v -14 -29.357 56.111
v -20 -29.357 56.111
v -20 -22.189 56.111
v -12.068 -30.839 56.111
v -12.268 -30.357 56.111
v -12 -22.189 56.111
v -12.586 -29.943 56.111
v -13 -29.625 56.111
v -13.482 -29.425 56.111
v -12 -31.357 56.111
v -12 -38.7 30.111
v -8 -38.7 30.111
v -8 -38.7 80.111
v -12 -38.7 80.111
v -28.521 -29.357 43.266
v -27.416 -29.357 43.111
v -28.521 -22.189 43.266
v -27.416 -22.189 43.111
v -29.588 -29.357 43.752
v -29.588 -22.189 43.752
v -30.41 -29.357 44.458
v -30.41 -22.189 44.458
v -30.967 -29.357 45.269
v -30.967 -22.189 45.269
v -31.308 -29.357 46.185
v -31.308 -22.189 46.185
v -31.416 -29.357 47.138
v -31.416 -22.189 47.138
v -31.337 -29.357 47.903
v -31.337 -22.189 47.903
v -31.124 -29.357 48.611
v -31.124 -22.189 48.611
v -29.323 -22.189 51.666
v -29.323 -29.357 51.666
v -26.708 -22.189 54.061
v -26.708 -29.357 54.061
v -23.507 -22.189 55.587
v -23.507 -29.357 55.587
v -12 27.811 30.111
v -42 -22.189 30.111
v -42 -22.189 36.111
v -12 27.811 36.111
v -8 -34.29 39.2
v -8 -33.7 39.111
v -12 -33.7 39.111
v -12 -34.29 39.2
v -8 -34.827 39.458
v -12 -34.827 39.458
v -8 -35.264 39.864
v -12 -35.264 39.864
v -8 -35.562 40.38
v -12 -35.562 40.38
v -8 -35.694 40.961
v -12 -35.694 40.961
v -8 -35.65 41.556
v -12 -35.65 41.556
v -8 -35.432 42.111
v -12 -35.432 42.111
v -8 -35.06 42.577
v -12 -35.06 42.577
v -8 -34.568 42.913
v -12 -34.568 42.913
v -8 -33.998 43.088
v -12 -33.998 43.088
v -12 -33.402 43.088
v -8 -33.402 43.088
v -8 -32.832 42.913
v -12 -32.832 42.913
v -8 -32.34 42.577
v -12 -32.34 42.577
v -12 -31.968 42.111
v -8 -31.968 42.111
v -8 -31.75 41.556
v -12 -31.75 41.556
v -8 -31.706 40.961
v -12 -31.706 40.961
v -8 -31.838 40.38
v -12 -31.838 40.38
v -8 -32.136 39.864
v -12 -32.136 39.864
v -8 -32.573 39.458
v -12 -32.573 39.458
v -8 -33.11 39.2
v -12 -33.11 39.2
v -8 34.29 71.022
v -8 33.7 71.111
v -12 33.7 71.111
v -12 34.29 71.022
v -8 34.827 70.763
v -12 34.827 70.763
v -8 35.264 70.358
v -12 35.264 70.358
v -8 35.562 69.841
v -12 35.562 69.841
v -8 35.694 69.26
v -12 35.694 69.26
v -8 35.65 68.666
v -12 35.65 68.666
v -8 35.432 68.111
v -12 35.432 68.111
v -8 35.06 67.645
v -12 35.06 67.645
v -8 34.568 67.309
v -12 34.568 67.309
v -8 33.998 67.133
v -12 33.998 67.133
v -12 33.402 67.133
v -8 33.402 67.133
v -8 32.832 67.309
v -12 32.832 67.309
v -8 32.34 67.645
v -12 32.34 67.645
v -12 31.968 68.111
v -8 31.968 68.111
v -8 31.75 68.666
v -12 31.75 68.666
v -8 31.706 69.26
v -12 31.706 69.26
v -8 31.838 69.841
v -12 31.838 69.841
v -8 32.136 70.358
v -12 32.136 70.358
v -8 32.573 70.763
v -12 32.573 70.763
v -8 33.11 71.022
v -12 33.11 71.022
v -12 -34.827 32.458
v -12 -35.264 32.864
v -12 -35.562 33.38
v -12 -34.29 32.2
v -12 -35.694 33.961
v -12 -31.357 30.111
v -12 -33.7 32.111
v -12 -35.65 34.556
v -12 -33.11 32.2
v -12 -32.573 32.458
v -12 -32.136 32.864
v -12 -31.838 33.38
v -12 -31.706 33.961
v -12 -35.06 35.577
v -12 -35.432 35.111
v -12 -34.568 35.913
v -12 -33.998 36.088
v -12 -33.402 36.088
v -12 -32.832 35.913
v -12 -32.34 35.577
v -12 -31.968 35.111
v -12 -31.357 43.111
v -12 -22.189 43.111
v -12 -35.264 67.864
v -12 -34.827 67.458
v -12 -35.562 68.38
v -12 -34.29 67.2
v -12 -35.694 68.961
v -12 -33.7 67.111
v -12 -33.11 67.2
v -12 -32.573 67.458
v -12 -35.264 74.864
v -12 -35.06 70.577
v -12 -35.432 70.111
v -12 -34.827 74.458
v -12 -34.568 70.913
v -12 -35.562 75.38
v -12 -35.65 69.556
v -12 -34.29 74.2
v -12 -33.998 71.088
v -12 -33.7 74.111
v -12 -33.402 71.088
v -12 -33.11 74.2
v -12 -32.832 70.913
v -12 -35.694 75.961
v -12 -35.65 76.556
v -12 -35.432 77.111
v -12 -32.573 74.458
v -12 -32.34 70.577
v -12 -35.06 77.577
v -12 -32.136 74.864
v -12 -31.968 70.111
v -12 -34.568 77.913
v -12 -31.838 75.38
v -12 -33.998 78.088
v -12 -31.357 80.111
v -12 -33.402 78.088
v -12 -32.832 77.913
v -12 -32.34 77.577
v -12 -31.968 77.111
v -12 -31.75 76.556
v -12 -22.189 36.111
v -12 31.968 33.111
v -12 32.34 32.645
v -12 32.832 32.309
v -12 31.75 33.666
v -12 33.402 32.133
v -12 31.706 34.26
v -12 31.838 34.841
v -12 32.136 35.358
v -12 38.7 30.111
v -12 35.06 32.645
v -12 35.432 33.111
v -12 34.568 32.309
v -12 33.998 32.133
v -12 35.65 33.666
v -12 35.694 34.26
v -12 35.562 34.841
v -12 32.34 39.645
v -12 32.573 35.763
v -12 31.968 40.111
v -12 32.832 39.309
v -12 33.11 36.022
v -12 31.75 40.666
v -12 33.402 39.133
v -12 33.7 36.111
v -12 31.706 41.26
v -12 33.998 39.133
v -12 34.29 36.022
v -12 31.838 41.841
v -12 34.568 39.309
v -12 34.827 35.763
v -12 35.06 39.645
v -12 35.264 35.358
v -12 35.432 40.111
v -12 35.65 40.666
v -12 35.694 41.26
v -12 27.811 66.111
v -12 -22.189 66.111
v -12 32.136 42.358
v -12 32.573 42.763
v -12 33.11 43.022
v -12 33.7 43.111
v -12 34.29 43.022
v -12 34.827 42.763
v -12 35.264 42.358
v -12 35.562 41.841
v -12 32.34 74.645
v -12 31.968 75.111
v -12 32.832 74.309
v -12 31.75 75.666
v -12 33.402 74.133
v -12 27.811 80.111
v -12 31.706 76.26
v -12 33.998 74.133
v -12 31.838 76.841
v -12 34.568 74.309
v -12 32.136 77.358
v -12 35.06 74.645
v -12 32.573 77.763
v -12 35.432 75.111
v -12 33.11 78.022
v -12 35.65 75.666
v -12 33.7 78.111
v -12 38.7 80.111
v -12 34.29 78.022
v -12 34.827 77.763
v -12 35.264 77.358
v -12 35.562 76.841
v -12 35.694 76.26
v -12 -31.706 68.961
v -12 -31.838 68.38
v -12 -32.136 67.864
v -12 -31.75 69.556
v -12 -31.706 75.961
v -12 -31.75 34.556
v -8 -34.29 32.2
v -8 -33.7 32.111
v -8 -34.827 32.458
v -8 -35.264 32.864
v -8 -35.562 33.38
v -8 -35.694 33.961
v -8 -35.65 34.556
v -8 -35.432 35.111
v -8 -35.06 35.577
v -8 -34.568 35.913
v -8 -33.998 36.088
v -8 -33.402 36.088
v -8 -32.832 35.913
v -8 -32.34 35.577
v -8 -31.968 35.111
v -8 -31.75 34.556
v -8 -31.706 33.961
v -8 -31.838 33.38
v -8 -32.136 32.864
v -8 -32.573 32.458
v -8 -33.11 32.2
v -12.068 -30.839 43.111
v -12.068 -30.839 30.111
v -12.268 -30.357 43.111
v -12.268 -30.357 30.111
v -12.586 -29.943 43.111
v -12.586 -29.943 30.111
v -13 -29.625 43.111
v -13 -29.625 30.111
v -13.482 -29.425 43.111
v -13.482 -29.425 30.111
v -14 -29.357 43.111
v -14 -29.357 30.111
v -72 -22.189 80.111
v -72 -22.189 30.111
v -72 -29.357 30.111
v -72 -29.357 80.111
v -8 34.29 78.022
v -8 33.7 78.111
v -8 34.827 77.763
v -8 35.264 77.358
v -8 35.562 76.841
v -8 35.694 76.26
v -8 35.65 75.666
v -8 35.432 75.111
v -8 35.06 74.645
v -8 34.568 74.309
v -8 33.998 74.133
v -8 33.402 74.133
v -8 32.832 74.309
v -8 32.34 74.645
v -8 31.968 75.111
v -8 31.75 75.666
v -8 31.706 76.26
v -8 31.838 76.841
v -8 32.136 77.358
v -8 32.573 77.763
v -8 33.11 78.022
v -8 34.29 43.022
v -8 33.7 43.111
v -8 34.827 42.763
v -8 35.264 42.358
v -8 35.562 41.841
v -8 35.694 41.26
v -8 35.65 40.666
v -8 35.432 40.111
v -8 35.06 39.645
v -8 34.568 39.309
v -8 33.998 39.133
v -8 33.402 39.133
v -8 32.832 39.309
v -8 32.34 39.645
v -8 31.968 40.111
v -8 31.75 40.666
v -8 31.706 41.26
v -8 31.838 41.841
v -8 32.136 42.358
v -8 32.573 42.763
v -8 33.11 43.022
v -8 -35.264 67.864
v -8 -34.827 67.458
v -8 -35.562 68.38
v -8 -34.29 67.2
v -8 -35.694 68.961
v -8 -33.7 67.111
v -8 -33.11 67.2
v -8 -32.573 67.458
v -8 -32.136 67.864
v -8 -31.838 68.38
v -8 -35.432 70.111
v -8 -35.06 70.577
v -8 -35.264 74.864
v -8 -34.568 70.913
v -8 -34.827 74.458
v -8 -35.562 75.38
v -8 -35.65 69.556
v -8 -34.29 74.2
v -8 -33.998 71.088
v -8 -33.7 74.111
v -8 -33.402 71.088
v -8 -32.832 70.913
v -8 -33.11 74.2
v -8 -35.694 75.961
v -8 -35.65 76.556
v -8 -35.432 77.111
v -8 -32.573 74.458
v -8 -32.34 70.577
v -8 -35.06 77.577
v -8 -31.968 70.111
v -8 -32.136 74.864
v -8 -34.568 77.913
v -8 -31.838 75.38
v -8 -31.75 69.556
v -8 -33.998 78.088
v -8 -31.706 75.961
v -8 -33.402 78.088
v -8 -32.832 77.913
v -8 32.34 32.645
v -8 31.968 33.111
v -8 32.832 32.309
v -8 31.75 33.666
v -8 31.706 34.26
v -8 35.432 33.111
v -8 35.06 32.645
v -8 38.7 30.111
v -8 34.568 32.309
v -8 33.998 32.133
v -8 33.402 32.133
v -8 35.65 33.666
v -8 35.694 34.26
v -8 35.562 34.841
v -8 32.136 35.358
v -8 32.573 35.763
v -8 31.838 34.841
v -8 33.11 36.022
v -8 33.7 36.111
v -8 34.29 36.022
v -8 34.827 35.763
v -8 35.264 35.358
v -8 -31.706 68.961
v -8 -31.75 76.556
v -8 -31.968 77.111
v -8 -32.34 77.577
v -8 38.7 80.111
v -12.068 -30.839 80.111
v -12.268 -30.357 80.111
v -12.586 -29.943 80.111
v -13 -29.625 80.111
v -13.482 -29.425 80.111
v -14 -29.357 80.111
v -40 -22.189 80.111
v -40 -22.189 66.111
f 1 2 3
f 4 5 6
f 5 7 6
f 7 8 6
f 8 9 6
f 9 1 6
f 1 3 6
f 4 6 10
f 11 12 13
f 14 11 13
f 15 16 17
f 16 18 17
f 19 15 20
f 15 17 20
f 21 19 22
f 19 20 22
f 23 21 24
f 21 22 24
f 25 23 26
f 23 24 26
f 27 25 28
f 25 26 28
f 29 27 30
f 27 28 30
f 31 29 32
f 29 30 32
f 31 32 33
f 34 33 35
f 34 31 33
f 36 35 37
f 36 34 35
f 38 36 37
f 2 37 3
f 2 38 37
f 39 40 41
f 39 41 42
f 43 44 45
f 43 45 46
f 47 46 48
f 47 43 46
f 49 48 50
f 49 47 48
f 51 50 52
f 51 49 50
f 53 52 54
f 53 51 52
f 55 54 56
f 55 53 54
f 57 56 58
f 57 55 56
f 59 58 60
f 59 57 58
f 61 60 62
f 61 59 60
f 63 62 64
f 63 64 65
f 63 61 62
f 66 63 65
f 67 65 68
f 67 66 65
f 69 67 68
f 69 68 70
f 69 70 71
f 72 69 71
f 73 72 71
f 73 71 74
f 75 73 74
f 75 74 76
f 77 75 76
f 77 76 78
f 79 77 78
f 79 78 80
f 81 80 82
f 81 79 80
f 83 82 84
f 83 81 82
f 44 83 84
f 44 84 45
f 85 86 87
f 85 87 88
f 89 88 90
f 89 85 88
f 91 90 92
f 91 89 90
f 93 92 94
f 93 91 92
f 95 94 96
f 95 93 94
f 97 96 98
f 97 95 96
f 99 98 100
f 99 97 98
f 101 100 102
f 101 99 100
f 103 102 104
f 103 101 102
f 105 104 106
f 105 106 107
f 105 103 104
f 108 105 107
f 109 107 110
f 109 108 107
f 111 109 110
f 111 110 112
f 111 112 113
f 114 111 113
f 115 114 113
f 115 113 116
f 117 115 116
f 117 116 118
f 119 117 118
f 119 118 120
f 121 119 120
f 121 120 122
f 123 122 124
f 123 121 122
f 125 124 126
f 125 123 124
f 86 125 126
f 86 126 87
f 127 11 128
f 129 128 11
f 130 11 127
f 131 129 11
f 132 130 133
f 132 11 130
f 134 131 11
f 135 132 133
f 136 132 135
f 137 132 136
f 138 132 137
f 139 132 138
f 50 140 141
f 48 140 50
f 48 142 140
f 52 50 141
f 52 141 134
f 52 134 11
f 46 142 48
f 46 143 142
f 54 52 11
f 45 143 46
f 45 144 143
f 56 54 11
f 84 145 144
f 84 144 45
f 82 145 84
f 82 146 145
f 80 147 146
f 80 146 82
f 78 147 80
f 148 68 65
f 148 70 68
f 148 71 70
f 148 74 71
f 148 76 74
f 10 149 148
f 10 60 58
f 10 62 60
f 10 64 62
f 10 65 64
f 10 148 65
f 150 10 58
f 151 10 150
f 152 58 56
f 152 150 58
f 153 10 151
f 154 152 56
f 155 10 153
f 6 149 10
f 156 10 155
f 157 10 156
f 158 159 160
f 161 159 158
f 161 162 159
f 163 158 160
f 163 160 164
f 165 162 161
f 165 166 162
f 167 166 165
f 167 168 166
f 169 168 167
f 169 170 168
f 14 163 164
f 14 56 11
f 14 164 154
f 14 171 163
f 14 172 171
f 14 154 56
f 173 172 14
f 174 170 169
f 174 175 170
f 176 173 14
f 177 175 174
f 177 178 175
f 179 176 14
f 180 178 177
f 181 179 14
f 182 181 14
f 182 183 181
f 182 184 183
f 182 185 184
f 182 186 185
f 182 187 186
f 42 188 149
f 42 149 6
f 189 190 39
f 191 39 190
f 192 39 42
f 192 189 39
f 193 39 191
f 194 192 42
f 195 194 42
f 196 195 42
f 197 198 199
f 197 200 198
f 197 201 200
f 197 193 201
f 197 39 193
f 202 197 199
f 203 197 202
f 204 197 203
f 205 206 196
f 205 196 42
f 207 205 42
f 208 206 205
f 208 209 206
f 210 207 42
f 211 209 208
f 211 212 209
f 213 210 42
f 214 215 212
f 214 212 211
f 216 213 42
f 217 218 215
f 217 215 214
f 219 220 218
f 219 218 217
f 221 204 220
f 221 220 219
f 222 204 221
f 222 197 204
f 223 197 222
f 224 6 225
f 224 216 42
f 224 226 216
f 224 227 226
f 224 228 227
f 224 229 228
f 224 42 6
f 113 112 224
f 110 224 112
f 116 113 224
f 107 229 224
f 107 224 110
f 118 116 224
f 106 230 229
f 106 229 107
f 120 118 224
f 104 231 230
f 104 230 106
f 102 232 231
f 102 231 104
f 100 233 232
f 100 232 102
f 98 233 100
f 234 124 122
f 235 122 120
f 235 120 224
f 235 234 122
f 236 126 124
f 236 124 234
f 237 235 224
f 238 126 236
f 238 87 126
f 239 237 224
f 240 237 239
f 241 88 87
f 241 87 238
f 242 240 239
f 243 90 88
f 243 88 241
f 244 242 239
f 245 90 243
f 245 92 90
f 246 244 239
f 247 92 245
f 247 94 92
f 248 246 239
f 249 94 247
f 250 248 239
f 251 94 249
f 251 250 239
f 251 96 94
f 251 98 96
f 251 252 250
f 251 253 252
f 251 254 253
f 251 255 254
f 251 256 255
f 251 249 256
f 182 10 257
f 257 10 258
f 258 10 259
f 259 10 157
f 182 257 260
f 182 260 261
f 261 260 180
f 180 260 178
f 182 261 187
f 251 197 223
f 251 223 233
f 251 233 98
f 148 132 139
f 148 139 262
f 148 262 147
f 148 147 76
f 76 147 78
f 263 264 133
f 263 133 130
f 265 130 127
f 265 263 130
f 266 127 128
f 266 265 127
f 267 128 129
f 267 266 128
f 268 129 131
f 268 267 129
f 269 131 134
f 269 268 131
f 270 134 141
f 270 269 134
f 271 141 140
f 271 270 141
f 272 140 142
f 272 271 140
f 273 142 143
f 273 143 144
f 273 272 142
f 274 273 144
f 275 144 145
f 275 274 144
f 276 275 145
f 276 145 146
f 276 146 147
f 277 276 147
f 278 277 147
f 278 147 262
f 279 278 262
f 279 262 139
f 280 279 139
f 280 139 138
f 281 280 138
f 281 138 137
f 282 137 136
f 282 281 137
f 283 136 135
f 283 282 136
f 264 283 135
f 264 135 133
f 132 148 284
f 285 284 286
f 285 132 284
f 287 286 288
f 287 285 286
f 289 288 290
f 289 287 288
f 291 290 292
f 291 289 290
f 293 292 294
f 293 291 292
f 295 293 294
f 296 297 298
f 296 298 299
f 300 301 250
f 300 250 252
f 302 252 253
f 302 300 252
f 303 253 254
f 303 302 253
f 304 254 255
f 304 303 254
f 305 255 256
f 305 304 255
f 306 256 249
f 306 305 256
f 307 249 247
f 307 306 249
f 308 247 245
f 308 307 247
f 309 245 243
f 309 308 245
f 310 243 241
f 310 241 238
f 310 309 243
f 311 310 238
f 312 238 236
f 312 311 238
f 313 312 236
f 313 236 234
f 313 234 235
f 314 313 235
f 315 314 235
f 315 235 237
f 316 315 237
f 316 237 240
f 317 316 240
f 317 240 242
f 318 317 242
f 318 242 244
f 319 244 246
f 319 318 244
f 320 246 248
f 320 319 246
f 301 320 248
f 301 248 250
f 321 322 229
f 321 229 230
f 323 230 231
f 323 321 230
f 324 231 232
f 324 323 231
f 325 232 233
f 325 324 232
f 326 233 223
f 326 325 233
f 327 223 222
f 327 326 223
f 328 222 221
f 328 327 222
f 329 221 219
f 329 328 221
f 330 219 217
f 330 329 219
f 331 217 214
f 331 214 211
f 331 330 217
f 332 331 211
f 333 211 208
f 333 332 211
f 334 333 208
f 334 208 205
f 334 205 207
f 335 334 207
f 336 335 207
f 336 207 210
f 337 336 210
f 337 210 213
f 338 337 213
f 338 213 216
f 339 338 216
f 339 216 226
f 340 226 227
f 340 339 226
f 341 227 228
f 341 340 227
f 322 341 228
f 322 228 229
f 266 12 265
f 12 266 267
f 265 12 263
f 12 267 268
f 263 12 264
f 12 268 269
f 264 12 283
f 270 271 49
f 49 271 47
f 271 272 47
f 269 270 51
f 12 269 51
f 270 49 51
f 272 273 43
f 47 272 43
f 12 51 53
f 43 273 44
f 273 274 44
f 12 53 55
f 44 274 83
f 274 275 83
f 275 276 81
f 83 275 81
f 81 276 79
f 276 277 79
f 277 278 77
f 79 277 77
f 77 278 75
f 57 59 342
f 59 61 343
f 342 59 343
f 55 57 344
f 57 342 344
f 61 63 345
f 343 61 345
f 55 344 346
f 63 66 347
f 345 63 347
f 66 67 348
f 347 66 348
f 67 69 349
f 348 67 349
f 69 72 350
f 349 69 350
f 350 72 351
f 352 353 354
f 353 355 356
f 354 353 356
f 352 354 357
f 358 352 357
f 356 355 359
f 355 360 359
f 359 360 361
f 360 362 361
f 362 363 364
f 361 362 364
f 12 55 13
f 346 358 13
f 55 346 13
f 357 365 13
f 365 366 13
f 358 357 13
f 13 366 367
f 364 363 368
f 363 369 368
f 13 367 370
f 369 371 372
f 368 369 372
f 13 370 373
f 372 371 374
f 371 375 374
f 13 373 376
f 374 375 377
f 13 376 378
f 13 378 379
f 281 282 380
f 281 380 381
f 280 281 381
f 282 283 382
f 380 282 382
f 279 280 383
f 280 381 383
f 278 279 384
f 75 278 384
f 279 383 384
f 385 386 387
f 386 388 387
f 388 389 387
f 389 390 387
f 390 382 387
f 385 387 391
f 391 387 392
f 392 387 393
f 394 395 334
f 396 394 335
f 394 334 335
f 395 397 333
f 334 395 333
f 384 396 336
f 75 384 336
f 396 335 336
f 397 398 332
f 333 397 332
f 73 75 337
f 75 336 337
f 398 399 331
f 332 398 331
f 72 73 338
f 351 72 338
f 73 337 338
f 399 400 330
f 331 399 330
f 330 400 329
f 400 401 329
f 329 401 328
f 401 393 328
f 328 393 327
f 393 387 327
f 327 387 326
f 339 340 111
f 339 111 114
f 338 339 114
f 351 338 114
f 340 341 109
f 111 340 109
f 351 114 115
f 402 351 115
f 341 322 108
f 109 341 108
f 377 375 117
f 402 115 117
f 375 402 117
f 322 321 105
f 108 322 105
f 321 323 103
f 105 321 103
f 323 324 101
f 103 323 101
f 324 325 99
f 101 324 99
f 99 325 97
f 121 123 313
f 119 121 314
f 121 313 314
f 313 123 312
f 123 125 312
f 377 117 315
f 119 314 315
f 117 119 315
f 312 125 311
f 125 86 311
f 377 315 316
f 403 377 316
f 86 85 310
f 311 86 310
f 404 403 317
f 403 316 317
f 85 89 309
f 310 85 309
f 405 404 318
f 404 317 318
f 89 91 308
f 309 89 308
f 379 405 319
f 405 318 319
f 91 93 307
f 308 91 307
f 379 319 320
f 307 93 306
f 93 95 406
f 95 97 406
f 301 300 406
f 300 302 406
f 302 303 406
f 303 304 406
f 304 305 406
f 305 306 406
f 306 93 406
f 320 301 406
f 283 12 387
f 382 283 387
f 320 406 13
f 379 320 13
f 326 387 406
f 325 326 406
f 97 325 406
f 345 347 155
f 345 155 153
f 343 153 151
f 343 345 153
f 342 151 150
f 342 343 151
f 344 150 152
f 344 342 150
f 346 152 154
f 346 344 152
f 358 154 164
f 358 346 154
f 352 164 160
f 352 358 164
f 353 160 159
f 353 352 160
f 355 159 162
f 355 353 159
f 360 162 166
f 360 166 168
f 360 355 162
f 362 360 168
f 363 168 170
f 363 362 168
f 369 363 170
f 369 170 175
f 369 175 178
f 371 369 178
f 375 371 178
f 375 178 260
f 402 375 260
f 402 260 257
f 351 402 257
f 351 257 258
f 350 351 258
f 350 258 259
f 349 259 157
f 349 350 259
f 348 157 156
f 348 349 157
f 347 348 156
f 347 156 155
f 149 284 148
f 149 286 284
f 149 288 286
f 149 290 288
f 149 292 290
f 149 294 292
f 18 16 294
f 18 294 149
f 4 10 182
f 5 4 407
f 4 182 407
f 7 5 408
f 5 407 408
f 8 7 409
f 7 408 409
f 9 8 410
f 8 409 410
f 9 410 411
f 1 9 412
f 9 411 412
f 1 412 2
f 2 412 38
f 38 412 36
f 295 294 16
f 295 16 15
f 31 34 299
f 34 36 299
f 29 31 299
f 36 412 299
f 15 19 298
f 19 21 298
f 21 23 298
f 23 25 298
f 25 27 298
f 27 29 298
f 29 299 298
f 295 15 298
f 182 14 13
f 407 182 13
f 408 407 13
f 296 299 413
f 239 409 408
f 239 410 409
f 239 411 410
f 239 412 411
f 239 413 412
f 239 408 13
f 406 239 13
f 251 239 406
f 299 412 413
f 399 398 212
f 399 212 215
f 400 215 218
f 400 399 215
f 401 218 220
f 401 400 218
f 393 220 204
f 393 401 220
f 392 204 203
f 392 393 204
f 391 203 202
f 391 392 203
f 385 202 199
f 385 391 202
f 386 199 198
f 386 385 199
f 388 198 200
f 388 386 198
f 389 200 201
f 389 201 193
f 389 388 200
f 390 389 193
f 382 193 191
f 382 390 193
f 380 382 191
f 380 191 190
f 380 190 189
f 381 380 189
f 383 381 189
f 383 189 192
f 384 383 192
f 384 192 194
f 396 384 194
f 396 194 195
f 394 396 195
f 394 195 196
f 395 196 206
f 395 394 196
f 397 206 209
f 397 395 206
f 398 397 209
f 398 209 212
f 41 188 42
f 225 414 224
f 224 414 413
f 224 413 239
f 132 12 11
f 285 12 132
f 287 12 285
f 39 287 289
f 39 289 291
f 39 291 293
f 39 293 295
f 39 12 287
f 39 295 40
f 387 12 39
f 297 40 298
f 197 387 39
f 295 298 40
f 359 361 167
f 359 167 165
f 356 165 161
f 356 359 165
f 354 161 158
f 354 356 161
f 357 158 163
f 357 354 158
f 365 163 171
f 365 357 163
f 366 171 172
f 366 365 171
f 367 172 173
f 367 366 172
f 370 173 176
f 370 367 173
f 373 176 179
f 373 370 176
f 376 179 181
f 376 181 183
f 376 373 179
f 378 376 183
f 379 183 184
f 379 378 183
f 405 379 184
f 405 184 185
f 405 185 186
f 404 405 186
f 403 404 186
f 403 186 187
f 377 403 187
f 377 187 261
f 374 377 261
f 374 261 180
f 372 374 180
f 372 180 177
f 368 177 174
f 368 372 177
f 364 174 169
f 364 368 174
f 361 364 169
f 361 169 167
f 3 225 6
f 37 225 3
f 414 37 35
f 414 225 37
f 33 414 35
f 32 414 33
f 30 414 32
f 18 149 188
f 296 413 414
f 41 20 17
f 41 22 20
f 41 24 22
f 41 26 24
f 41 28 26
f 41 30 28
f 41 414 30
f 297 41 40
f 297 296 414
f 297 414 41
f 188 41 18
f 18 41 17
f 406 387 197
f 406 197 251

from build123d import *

# Parameters (mm, degrees)
SKETCH1_W           = 50
SKETCH1_H           = 77.4
SKETCH1_R           = 2
BOSS_EXTRUDE1_DEPTH = 4
SKETCH2_W           = 50
SKETCH2_H           = 7.168288369
BOSS_EXTRUDE2_DEPTH = 60
SKETCH6_W           = 20
SKETCH6_H           = 26
CUT_EXTRUDE1_DEPTH  = 124.730240351
RIB1_REACH          = 97.821
SKETCH7_WALL_W      = 250.948466038
SKETCH7_WALL_H      = 14
FILLET2_R           = 2
FILLET3_R           = 12
SKETCH8_W           = 13
SKETCH8_H           = 7.168288369
BOSS_EXTRUDE3_DEPTH = 20
FILLET4_R           = 4
BOSS_EXTRUDE4_DEPTH = 6
FILLET5_R           = 2


with BuildPart() as part:
    # Sketch1 → Boss-Extrude1 (new body)
    with BuildSketch(Plane.ZY.offset(8)):
        with Locations((55.110705908, 0)):
            Rectangle(SKETCH1_W, SKETCH1_H)
        with Locations((34.110705908, 33.7)):
            Circle(SKETCH1_R, mode=Mode.SUBTRACT)
        with Locations((41.110705908, 33.7)):
            Circle(SKETCH1_R, mode=Mode.SUBTRACT)
        with Locations((69.110705908, 33.7)):
            Circle(SKETCH1_R, mode=Mode.SUBTRACT)
        with Locations((76.110705908, 33.7)):
            Circle(SKETCH1_R, mode=Mode.SUBTRACT)
        with Locations(Location((34.110705908, -33.7, 0), (0, 0, 180))):
            Circle(SKETCH1_R, mode=Mode.SUBTRACT)
        with Locations(Location((41.110705908, -33.7, 0), (0, 0, 180))):
            Circle(SKETCH1_R, mode=Mode.SUBTRACT)
        with Locations(Location((69.110705908, -33.7, 0), (0, 0, 180))):
            Circle(SKETCH1_R, mode=Mode.SUBTRACT)
        with Locations(Location((76.110705908, -33.7, 0), (0, 0, 180))):
            Circle(SKETCH1_R, mode=Mode.SUBTRACT)
    extrude(amount=BOSS_EXTRUDE1_DEPTH)

    # Sketch2 → Boss-Extrude2 (add)
    with BuildSketch(Plane.ZY.offset(12)):
        with Locations((55.110705908, -25.772954127)):
            Rectangle(SKETCH2_W, SKETCH2_H)
    extrude(amount=BOSS_EXTRUDE2_DEPTH)

    # Sketch6 → Cut-Extrude1 (cut, through all)
    with BuildSketch(Plane(origin=(0, -22.188809942, 0), x_dir=(1, 0, 0), z_dir=(0, 1, 0))):
        with Locations((-22, -43.110705908)):
            Rectangle(SKETCH6_W, SKETCH6_H)
    extrude(amount=-CUT_EXTRUDE1_DEPTH, mode=Mode.SUBTRACT)

    # Sketch7 wall → Rib1 (add, up to next)
    with BuildSketch(Plane(origin=(-26, 2.811190058, 80.110705908), x_dir=(0.488603368932, 0.87250601595, 0), z_dir=(-0.87250601595, 0.488603368932, 0)), mode=Mode.PRIVATE) as rib1_sk1:
        with Locations((0, 7)):
            Rectangle(SKETCH7_WALL_W, SKETCH7_WALL_H)
    rib1_tool1 = extrude(rib1_sk1.sketch, amount=-RIB1_REACH, mode=Mode.PRIVATE) - part.part
    add(rib1_tool1.solids().sort_by_distance((-26, 2.811190058, 80.110705908))[0])

    # Fillet2
    fillet2_edges = [part.edges().sort_by_distance(p)[0] for p in [
        (-12, -29.357098311, 68.110705908),
    ]]
    fillet(fillet2_edges, radius=FILLET2_R)

    # Fillet3
    fillet3_edges = [part.edges().sort_by_distance(p)[0] for p in [
        (-32, -25.772954126, 56.110705908),
    ]]
    fillet(fillet3_edges, radius=FILLET3_R)

    # Sketch8 → Boss-Extrude3 (add)
    with BuildSketch(Plane(origin=(-32, 0, 0), x_dir=(0, 0, -1), z_dir=(1, 0, 0))):
        with Locations((-36.610705908, -25.772954127)):
            Rectangle(SKETCH8_W, SKETCH8_H)
    extrude(amount=BOSS_EXTRUDE3_DEPTH)

    # Fillet4
    fillet4_edges = [part.edges().sort_by_distance(p)[0] for p in [
        (-32, -25.772954126, 43.110705908),
    ]]
    fillet(fillet4_edges, radius=FILLET4_R)

    # Sketch9 → Boss-Extrude4 (add)
    with BuildSketch(Plane(origin=(0, 0, 30.110705908), x_dir=(-1, 0, 0), z_dir=(0, 0, -1))):
        Polygon((42, -22.188809942), (12, 27.811190058), (12, -22.188809942), align=None)
    extrude(amount=-BOSS_EXTRUDE4_DEPTH)

    # Fillet5
    fillet5_edges = [part.edges().sort_by_distance(p)[0] for p in [
        (-12, -29.357098311, 36.610705908),
    ]]
    fillet(fillet5_edges, radius=FILLET5_R)


solid = part.part
